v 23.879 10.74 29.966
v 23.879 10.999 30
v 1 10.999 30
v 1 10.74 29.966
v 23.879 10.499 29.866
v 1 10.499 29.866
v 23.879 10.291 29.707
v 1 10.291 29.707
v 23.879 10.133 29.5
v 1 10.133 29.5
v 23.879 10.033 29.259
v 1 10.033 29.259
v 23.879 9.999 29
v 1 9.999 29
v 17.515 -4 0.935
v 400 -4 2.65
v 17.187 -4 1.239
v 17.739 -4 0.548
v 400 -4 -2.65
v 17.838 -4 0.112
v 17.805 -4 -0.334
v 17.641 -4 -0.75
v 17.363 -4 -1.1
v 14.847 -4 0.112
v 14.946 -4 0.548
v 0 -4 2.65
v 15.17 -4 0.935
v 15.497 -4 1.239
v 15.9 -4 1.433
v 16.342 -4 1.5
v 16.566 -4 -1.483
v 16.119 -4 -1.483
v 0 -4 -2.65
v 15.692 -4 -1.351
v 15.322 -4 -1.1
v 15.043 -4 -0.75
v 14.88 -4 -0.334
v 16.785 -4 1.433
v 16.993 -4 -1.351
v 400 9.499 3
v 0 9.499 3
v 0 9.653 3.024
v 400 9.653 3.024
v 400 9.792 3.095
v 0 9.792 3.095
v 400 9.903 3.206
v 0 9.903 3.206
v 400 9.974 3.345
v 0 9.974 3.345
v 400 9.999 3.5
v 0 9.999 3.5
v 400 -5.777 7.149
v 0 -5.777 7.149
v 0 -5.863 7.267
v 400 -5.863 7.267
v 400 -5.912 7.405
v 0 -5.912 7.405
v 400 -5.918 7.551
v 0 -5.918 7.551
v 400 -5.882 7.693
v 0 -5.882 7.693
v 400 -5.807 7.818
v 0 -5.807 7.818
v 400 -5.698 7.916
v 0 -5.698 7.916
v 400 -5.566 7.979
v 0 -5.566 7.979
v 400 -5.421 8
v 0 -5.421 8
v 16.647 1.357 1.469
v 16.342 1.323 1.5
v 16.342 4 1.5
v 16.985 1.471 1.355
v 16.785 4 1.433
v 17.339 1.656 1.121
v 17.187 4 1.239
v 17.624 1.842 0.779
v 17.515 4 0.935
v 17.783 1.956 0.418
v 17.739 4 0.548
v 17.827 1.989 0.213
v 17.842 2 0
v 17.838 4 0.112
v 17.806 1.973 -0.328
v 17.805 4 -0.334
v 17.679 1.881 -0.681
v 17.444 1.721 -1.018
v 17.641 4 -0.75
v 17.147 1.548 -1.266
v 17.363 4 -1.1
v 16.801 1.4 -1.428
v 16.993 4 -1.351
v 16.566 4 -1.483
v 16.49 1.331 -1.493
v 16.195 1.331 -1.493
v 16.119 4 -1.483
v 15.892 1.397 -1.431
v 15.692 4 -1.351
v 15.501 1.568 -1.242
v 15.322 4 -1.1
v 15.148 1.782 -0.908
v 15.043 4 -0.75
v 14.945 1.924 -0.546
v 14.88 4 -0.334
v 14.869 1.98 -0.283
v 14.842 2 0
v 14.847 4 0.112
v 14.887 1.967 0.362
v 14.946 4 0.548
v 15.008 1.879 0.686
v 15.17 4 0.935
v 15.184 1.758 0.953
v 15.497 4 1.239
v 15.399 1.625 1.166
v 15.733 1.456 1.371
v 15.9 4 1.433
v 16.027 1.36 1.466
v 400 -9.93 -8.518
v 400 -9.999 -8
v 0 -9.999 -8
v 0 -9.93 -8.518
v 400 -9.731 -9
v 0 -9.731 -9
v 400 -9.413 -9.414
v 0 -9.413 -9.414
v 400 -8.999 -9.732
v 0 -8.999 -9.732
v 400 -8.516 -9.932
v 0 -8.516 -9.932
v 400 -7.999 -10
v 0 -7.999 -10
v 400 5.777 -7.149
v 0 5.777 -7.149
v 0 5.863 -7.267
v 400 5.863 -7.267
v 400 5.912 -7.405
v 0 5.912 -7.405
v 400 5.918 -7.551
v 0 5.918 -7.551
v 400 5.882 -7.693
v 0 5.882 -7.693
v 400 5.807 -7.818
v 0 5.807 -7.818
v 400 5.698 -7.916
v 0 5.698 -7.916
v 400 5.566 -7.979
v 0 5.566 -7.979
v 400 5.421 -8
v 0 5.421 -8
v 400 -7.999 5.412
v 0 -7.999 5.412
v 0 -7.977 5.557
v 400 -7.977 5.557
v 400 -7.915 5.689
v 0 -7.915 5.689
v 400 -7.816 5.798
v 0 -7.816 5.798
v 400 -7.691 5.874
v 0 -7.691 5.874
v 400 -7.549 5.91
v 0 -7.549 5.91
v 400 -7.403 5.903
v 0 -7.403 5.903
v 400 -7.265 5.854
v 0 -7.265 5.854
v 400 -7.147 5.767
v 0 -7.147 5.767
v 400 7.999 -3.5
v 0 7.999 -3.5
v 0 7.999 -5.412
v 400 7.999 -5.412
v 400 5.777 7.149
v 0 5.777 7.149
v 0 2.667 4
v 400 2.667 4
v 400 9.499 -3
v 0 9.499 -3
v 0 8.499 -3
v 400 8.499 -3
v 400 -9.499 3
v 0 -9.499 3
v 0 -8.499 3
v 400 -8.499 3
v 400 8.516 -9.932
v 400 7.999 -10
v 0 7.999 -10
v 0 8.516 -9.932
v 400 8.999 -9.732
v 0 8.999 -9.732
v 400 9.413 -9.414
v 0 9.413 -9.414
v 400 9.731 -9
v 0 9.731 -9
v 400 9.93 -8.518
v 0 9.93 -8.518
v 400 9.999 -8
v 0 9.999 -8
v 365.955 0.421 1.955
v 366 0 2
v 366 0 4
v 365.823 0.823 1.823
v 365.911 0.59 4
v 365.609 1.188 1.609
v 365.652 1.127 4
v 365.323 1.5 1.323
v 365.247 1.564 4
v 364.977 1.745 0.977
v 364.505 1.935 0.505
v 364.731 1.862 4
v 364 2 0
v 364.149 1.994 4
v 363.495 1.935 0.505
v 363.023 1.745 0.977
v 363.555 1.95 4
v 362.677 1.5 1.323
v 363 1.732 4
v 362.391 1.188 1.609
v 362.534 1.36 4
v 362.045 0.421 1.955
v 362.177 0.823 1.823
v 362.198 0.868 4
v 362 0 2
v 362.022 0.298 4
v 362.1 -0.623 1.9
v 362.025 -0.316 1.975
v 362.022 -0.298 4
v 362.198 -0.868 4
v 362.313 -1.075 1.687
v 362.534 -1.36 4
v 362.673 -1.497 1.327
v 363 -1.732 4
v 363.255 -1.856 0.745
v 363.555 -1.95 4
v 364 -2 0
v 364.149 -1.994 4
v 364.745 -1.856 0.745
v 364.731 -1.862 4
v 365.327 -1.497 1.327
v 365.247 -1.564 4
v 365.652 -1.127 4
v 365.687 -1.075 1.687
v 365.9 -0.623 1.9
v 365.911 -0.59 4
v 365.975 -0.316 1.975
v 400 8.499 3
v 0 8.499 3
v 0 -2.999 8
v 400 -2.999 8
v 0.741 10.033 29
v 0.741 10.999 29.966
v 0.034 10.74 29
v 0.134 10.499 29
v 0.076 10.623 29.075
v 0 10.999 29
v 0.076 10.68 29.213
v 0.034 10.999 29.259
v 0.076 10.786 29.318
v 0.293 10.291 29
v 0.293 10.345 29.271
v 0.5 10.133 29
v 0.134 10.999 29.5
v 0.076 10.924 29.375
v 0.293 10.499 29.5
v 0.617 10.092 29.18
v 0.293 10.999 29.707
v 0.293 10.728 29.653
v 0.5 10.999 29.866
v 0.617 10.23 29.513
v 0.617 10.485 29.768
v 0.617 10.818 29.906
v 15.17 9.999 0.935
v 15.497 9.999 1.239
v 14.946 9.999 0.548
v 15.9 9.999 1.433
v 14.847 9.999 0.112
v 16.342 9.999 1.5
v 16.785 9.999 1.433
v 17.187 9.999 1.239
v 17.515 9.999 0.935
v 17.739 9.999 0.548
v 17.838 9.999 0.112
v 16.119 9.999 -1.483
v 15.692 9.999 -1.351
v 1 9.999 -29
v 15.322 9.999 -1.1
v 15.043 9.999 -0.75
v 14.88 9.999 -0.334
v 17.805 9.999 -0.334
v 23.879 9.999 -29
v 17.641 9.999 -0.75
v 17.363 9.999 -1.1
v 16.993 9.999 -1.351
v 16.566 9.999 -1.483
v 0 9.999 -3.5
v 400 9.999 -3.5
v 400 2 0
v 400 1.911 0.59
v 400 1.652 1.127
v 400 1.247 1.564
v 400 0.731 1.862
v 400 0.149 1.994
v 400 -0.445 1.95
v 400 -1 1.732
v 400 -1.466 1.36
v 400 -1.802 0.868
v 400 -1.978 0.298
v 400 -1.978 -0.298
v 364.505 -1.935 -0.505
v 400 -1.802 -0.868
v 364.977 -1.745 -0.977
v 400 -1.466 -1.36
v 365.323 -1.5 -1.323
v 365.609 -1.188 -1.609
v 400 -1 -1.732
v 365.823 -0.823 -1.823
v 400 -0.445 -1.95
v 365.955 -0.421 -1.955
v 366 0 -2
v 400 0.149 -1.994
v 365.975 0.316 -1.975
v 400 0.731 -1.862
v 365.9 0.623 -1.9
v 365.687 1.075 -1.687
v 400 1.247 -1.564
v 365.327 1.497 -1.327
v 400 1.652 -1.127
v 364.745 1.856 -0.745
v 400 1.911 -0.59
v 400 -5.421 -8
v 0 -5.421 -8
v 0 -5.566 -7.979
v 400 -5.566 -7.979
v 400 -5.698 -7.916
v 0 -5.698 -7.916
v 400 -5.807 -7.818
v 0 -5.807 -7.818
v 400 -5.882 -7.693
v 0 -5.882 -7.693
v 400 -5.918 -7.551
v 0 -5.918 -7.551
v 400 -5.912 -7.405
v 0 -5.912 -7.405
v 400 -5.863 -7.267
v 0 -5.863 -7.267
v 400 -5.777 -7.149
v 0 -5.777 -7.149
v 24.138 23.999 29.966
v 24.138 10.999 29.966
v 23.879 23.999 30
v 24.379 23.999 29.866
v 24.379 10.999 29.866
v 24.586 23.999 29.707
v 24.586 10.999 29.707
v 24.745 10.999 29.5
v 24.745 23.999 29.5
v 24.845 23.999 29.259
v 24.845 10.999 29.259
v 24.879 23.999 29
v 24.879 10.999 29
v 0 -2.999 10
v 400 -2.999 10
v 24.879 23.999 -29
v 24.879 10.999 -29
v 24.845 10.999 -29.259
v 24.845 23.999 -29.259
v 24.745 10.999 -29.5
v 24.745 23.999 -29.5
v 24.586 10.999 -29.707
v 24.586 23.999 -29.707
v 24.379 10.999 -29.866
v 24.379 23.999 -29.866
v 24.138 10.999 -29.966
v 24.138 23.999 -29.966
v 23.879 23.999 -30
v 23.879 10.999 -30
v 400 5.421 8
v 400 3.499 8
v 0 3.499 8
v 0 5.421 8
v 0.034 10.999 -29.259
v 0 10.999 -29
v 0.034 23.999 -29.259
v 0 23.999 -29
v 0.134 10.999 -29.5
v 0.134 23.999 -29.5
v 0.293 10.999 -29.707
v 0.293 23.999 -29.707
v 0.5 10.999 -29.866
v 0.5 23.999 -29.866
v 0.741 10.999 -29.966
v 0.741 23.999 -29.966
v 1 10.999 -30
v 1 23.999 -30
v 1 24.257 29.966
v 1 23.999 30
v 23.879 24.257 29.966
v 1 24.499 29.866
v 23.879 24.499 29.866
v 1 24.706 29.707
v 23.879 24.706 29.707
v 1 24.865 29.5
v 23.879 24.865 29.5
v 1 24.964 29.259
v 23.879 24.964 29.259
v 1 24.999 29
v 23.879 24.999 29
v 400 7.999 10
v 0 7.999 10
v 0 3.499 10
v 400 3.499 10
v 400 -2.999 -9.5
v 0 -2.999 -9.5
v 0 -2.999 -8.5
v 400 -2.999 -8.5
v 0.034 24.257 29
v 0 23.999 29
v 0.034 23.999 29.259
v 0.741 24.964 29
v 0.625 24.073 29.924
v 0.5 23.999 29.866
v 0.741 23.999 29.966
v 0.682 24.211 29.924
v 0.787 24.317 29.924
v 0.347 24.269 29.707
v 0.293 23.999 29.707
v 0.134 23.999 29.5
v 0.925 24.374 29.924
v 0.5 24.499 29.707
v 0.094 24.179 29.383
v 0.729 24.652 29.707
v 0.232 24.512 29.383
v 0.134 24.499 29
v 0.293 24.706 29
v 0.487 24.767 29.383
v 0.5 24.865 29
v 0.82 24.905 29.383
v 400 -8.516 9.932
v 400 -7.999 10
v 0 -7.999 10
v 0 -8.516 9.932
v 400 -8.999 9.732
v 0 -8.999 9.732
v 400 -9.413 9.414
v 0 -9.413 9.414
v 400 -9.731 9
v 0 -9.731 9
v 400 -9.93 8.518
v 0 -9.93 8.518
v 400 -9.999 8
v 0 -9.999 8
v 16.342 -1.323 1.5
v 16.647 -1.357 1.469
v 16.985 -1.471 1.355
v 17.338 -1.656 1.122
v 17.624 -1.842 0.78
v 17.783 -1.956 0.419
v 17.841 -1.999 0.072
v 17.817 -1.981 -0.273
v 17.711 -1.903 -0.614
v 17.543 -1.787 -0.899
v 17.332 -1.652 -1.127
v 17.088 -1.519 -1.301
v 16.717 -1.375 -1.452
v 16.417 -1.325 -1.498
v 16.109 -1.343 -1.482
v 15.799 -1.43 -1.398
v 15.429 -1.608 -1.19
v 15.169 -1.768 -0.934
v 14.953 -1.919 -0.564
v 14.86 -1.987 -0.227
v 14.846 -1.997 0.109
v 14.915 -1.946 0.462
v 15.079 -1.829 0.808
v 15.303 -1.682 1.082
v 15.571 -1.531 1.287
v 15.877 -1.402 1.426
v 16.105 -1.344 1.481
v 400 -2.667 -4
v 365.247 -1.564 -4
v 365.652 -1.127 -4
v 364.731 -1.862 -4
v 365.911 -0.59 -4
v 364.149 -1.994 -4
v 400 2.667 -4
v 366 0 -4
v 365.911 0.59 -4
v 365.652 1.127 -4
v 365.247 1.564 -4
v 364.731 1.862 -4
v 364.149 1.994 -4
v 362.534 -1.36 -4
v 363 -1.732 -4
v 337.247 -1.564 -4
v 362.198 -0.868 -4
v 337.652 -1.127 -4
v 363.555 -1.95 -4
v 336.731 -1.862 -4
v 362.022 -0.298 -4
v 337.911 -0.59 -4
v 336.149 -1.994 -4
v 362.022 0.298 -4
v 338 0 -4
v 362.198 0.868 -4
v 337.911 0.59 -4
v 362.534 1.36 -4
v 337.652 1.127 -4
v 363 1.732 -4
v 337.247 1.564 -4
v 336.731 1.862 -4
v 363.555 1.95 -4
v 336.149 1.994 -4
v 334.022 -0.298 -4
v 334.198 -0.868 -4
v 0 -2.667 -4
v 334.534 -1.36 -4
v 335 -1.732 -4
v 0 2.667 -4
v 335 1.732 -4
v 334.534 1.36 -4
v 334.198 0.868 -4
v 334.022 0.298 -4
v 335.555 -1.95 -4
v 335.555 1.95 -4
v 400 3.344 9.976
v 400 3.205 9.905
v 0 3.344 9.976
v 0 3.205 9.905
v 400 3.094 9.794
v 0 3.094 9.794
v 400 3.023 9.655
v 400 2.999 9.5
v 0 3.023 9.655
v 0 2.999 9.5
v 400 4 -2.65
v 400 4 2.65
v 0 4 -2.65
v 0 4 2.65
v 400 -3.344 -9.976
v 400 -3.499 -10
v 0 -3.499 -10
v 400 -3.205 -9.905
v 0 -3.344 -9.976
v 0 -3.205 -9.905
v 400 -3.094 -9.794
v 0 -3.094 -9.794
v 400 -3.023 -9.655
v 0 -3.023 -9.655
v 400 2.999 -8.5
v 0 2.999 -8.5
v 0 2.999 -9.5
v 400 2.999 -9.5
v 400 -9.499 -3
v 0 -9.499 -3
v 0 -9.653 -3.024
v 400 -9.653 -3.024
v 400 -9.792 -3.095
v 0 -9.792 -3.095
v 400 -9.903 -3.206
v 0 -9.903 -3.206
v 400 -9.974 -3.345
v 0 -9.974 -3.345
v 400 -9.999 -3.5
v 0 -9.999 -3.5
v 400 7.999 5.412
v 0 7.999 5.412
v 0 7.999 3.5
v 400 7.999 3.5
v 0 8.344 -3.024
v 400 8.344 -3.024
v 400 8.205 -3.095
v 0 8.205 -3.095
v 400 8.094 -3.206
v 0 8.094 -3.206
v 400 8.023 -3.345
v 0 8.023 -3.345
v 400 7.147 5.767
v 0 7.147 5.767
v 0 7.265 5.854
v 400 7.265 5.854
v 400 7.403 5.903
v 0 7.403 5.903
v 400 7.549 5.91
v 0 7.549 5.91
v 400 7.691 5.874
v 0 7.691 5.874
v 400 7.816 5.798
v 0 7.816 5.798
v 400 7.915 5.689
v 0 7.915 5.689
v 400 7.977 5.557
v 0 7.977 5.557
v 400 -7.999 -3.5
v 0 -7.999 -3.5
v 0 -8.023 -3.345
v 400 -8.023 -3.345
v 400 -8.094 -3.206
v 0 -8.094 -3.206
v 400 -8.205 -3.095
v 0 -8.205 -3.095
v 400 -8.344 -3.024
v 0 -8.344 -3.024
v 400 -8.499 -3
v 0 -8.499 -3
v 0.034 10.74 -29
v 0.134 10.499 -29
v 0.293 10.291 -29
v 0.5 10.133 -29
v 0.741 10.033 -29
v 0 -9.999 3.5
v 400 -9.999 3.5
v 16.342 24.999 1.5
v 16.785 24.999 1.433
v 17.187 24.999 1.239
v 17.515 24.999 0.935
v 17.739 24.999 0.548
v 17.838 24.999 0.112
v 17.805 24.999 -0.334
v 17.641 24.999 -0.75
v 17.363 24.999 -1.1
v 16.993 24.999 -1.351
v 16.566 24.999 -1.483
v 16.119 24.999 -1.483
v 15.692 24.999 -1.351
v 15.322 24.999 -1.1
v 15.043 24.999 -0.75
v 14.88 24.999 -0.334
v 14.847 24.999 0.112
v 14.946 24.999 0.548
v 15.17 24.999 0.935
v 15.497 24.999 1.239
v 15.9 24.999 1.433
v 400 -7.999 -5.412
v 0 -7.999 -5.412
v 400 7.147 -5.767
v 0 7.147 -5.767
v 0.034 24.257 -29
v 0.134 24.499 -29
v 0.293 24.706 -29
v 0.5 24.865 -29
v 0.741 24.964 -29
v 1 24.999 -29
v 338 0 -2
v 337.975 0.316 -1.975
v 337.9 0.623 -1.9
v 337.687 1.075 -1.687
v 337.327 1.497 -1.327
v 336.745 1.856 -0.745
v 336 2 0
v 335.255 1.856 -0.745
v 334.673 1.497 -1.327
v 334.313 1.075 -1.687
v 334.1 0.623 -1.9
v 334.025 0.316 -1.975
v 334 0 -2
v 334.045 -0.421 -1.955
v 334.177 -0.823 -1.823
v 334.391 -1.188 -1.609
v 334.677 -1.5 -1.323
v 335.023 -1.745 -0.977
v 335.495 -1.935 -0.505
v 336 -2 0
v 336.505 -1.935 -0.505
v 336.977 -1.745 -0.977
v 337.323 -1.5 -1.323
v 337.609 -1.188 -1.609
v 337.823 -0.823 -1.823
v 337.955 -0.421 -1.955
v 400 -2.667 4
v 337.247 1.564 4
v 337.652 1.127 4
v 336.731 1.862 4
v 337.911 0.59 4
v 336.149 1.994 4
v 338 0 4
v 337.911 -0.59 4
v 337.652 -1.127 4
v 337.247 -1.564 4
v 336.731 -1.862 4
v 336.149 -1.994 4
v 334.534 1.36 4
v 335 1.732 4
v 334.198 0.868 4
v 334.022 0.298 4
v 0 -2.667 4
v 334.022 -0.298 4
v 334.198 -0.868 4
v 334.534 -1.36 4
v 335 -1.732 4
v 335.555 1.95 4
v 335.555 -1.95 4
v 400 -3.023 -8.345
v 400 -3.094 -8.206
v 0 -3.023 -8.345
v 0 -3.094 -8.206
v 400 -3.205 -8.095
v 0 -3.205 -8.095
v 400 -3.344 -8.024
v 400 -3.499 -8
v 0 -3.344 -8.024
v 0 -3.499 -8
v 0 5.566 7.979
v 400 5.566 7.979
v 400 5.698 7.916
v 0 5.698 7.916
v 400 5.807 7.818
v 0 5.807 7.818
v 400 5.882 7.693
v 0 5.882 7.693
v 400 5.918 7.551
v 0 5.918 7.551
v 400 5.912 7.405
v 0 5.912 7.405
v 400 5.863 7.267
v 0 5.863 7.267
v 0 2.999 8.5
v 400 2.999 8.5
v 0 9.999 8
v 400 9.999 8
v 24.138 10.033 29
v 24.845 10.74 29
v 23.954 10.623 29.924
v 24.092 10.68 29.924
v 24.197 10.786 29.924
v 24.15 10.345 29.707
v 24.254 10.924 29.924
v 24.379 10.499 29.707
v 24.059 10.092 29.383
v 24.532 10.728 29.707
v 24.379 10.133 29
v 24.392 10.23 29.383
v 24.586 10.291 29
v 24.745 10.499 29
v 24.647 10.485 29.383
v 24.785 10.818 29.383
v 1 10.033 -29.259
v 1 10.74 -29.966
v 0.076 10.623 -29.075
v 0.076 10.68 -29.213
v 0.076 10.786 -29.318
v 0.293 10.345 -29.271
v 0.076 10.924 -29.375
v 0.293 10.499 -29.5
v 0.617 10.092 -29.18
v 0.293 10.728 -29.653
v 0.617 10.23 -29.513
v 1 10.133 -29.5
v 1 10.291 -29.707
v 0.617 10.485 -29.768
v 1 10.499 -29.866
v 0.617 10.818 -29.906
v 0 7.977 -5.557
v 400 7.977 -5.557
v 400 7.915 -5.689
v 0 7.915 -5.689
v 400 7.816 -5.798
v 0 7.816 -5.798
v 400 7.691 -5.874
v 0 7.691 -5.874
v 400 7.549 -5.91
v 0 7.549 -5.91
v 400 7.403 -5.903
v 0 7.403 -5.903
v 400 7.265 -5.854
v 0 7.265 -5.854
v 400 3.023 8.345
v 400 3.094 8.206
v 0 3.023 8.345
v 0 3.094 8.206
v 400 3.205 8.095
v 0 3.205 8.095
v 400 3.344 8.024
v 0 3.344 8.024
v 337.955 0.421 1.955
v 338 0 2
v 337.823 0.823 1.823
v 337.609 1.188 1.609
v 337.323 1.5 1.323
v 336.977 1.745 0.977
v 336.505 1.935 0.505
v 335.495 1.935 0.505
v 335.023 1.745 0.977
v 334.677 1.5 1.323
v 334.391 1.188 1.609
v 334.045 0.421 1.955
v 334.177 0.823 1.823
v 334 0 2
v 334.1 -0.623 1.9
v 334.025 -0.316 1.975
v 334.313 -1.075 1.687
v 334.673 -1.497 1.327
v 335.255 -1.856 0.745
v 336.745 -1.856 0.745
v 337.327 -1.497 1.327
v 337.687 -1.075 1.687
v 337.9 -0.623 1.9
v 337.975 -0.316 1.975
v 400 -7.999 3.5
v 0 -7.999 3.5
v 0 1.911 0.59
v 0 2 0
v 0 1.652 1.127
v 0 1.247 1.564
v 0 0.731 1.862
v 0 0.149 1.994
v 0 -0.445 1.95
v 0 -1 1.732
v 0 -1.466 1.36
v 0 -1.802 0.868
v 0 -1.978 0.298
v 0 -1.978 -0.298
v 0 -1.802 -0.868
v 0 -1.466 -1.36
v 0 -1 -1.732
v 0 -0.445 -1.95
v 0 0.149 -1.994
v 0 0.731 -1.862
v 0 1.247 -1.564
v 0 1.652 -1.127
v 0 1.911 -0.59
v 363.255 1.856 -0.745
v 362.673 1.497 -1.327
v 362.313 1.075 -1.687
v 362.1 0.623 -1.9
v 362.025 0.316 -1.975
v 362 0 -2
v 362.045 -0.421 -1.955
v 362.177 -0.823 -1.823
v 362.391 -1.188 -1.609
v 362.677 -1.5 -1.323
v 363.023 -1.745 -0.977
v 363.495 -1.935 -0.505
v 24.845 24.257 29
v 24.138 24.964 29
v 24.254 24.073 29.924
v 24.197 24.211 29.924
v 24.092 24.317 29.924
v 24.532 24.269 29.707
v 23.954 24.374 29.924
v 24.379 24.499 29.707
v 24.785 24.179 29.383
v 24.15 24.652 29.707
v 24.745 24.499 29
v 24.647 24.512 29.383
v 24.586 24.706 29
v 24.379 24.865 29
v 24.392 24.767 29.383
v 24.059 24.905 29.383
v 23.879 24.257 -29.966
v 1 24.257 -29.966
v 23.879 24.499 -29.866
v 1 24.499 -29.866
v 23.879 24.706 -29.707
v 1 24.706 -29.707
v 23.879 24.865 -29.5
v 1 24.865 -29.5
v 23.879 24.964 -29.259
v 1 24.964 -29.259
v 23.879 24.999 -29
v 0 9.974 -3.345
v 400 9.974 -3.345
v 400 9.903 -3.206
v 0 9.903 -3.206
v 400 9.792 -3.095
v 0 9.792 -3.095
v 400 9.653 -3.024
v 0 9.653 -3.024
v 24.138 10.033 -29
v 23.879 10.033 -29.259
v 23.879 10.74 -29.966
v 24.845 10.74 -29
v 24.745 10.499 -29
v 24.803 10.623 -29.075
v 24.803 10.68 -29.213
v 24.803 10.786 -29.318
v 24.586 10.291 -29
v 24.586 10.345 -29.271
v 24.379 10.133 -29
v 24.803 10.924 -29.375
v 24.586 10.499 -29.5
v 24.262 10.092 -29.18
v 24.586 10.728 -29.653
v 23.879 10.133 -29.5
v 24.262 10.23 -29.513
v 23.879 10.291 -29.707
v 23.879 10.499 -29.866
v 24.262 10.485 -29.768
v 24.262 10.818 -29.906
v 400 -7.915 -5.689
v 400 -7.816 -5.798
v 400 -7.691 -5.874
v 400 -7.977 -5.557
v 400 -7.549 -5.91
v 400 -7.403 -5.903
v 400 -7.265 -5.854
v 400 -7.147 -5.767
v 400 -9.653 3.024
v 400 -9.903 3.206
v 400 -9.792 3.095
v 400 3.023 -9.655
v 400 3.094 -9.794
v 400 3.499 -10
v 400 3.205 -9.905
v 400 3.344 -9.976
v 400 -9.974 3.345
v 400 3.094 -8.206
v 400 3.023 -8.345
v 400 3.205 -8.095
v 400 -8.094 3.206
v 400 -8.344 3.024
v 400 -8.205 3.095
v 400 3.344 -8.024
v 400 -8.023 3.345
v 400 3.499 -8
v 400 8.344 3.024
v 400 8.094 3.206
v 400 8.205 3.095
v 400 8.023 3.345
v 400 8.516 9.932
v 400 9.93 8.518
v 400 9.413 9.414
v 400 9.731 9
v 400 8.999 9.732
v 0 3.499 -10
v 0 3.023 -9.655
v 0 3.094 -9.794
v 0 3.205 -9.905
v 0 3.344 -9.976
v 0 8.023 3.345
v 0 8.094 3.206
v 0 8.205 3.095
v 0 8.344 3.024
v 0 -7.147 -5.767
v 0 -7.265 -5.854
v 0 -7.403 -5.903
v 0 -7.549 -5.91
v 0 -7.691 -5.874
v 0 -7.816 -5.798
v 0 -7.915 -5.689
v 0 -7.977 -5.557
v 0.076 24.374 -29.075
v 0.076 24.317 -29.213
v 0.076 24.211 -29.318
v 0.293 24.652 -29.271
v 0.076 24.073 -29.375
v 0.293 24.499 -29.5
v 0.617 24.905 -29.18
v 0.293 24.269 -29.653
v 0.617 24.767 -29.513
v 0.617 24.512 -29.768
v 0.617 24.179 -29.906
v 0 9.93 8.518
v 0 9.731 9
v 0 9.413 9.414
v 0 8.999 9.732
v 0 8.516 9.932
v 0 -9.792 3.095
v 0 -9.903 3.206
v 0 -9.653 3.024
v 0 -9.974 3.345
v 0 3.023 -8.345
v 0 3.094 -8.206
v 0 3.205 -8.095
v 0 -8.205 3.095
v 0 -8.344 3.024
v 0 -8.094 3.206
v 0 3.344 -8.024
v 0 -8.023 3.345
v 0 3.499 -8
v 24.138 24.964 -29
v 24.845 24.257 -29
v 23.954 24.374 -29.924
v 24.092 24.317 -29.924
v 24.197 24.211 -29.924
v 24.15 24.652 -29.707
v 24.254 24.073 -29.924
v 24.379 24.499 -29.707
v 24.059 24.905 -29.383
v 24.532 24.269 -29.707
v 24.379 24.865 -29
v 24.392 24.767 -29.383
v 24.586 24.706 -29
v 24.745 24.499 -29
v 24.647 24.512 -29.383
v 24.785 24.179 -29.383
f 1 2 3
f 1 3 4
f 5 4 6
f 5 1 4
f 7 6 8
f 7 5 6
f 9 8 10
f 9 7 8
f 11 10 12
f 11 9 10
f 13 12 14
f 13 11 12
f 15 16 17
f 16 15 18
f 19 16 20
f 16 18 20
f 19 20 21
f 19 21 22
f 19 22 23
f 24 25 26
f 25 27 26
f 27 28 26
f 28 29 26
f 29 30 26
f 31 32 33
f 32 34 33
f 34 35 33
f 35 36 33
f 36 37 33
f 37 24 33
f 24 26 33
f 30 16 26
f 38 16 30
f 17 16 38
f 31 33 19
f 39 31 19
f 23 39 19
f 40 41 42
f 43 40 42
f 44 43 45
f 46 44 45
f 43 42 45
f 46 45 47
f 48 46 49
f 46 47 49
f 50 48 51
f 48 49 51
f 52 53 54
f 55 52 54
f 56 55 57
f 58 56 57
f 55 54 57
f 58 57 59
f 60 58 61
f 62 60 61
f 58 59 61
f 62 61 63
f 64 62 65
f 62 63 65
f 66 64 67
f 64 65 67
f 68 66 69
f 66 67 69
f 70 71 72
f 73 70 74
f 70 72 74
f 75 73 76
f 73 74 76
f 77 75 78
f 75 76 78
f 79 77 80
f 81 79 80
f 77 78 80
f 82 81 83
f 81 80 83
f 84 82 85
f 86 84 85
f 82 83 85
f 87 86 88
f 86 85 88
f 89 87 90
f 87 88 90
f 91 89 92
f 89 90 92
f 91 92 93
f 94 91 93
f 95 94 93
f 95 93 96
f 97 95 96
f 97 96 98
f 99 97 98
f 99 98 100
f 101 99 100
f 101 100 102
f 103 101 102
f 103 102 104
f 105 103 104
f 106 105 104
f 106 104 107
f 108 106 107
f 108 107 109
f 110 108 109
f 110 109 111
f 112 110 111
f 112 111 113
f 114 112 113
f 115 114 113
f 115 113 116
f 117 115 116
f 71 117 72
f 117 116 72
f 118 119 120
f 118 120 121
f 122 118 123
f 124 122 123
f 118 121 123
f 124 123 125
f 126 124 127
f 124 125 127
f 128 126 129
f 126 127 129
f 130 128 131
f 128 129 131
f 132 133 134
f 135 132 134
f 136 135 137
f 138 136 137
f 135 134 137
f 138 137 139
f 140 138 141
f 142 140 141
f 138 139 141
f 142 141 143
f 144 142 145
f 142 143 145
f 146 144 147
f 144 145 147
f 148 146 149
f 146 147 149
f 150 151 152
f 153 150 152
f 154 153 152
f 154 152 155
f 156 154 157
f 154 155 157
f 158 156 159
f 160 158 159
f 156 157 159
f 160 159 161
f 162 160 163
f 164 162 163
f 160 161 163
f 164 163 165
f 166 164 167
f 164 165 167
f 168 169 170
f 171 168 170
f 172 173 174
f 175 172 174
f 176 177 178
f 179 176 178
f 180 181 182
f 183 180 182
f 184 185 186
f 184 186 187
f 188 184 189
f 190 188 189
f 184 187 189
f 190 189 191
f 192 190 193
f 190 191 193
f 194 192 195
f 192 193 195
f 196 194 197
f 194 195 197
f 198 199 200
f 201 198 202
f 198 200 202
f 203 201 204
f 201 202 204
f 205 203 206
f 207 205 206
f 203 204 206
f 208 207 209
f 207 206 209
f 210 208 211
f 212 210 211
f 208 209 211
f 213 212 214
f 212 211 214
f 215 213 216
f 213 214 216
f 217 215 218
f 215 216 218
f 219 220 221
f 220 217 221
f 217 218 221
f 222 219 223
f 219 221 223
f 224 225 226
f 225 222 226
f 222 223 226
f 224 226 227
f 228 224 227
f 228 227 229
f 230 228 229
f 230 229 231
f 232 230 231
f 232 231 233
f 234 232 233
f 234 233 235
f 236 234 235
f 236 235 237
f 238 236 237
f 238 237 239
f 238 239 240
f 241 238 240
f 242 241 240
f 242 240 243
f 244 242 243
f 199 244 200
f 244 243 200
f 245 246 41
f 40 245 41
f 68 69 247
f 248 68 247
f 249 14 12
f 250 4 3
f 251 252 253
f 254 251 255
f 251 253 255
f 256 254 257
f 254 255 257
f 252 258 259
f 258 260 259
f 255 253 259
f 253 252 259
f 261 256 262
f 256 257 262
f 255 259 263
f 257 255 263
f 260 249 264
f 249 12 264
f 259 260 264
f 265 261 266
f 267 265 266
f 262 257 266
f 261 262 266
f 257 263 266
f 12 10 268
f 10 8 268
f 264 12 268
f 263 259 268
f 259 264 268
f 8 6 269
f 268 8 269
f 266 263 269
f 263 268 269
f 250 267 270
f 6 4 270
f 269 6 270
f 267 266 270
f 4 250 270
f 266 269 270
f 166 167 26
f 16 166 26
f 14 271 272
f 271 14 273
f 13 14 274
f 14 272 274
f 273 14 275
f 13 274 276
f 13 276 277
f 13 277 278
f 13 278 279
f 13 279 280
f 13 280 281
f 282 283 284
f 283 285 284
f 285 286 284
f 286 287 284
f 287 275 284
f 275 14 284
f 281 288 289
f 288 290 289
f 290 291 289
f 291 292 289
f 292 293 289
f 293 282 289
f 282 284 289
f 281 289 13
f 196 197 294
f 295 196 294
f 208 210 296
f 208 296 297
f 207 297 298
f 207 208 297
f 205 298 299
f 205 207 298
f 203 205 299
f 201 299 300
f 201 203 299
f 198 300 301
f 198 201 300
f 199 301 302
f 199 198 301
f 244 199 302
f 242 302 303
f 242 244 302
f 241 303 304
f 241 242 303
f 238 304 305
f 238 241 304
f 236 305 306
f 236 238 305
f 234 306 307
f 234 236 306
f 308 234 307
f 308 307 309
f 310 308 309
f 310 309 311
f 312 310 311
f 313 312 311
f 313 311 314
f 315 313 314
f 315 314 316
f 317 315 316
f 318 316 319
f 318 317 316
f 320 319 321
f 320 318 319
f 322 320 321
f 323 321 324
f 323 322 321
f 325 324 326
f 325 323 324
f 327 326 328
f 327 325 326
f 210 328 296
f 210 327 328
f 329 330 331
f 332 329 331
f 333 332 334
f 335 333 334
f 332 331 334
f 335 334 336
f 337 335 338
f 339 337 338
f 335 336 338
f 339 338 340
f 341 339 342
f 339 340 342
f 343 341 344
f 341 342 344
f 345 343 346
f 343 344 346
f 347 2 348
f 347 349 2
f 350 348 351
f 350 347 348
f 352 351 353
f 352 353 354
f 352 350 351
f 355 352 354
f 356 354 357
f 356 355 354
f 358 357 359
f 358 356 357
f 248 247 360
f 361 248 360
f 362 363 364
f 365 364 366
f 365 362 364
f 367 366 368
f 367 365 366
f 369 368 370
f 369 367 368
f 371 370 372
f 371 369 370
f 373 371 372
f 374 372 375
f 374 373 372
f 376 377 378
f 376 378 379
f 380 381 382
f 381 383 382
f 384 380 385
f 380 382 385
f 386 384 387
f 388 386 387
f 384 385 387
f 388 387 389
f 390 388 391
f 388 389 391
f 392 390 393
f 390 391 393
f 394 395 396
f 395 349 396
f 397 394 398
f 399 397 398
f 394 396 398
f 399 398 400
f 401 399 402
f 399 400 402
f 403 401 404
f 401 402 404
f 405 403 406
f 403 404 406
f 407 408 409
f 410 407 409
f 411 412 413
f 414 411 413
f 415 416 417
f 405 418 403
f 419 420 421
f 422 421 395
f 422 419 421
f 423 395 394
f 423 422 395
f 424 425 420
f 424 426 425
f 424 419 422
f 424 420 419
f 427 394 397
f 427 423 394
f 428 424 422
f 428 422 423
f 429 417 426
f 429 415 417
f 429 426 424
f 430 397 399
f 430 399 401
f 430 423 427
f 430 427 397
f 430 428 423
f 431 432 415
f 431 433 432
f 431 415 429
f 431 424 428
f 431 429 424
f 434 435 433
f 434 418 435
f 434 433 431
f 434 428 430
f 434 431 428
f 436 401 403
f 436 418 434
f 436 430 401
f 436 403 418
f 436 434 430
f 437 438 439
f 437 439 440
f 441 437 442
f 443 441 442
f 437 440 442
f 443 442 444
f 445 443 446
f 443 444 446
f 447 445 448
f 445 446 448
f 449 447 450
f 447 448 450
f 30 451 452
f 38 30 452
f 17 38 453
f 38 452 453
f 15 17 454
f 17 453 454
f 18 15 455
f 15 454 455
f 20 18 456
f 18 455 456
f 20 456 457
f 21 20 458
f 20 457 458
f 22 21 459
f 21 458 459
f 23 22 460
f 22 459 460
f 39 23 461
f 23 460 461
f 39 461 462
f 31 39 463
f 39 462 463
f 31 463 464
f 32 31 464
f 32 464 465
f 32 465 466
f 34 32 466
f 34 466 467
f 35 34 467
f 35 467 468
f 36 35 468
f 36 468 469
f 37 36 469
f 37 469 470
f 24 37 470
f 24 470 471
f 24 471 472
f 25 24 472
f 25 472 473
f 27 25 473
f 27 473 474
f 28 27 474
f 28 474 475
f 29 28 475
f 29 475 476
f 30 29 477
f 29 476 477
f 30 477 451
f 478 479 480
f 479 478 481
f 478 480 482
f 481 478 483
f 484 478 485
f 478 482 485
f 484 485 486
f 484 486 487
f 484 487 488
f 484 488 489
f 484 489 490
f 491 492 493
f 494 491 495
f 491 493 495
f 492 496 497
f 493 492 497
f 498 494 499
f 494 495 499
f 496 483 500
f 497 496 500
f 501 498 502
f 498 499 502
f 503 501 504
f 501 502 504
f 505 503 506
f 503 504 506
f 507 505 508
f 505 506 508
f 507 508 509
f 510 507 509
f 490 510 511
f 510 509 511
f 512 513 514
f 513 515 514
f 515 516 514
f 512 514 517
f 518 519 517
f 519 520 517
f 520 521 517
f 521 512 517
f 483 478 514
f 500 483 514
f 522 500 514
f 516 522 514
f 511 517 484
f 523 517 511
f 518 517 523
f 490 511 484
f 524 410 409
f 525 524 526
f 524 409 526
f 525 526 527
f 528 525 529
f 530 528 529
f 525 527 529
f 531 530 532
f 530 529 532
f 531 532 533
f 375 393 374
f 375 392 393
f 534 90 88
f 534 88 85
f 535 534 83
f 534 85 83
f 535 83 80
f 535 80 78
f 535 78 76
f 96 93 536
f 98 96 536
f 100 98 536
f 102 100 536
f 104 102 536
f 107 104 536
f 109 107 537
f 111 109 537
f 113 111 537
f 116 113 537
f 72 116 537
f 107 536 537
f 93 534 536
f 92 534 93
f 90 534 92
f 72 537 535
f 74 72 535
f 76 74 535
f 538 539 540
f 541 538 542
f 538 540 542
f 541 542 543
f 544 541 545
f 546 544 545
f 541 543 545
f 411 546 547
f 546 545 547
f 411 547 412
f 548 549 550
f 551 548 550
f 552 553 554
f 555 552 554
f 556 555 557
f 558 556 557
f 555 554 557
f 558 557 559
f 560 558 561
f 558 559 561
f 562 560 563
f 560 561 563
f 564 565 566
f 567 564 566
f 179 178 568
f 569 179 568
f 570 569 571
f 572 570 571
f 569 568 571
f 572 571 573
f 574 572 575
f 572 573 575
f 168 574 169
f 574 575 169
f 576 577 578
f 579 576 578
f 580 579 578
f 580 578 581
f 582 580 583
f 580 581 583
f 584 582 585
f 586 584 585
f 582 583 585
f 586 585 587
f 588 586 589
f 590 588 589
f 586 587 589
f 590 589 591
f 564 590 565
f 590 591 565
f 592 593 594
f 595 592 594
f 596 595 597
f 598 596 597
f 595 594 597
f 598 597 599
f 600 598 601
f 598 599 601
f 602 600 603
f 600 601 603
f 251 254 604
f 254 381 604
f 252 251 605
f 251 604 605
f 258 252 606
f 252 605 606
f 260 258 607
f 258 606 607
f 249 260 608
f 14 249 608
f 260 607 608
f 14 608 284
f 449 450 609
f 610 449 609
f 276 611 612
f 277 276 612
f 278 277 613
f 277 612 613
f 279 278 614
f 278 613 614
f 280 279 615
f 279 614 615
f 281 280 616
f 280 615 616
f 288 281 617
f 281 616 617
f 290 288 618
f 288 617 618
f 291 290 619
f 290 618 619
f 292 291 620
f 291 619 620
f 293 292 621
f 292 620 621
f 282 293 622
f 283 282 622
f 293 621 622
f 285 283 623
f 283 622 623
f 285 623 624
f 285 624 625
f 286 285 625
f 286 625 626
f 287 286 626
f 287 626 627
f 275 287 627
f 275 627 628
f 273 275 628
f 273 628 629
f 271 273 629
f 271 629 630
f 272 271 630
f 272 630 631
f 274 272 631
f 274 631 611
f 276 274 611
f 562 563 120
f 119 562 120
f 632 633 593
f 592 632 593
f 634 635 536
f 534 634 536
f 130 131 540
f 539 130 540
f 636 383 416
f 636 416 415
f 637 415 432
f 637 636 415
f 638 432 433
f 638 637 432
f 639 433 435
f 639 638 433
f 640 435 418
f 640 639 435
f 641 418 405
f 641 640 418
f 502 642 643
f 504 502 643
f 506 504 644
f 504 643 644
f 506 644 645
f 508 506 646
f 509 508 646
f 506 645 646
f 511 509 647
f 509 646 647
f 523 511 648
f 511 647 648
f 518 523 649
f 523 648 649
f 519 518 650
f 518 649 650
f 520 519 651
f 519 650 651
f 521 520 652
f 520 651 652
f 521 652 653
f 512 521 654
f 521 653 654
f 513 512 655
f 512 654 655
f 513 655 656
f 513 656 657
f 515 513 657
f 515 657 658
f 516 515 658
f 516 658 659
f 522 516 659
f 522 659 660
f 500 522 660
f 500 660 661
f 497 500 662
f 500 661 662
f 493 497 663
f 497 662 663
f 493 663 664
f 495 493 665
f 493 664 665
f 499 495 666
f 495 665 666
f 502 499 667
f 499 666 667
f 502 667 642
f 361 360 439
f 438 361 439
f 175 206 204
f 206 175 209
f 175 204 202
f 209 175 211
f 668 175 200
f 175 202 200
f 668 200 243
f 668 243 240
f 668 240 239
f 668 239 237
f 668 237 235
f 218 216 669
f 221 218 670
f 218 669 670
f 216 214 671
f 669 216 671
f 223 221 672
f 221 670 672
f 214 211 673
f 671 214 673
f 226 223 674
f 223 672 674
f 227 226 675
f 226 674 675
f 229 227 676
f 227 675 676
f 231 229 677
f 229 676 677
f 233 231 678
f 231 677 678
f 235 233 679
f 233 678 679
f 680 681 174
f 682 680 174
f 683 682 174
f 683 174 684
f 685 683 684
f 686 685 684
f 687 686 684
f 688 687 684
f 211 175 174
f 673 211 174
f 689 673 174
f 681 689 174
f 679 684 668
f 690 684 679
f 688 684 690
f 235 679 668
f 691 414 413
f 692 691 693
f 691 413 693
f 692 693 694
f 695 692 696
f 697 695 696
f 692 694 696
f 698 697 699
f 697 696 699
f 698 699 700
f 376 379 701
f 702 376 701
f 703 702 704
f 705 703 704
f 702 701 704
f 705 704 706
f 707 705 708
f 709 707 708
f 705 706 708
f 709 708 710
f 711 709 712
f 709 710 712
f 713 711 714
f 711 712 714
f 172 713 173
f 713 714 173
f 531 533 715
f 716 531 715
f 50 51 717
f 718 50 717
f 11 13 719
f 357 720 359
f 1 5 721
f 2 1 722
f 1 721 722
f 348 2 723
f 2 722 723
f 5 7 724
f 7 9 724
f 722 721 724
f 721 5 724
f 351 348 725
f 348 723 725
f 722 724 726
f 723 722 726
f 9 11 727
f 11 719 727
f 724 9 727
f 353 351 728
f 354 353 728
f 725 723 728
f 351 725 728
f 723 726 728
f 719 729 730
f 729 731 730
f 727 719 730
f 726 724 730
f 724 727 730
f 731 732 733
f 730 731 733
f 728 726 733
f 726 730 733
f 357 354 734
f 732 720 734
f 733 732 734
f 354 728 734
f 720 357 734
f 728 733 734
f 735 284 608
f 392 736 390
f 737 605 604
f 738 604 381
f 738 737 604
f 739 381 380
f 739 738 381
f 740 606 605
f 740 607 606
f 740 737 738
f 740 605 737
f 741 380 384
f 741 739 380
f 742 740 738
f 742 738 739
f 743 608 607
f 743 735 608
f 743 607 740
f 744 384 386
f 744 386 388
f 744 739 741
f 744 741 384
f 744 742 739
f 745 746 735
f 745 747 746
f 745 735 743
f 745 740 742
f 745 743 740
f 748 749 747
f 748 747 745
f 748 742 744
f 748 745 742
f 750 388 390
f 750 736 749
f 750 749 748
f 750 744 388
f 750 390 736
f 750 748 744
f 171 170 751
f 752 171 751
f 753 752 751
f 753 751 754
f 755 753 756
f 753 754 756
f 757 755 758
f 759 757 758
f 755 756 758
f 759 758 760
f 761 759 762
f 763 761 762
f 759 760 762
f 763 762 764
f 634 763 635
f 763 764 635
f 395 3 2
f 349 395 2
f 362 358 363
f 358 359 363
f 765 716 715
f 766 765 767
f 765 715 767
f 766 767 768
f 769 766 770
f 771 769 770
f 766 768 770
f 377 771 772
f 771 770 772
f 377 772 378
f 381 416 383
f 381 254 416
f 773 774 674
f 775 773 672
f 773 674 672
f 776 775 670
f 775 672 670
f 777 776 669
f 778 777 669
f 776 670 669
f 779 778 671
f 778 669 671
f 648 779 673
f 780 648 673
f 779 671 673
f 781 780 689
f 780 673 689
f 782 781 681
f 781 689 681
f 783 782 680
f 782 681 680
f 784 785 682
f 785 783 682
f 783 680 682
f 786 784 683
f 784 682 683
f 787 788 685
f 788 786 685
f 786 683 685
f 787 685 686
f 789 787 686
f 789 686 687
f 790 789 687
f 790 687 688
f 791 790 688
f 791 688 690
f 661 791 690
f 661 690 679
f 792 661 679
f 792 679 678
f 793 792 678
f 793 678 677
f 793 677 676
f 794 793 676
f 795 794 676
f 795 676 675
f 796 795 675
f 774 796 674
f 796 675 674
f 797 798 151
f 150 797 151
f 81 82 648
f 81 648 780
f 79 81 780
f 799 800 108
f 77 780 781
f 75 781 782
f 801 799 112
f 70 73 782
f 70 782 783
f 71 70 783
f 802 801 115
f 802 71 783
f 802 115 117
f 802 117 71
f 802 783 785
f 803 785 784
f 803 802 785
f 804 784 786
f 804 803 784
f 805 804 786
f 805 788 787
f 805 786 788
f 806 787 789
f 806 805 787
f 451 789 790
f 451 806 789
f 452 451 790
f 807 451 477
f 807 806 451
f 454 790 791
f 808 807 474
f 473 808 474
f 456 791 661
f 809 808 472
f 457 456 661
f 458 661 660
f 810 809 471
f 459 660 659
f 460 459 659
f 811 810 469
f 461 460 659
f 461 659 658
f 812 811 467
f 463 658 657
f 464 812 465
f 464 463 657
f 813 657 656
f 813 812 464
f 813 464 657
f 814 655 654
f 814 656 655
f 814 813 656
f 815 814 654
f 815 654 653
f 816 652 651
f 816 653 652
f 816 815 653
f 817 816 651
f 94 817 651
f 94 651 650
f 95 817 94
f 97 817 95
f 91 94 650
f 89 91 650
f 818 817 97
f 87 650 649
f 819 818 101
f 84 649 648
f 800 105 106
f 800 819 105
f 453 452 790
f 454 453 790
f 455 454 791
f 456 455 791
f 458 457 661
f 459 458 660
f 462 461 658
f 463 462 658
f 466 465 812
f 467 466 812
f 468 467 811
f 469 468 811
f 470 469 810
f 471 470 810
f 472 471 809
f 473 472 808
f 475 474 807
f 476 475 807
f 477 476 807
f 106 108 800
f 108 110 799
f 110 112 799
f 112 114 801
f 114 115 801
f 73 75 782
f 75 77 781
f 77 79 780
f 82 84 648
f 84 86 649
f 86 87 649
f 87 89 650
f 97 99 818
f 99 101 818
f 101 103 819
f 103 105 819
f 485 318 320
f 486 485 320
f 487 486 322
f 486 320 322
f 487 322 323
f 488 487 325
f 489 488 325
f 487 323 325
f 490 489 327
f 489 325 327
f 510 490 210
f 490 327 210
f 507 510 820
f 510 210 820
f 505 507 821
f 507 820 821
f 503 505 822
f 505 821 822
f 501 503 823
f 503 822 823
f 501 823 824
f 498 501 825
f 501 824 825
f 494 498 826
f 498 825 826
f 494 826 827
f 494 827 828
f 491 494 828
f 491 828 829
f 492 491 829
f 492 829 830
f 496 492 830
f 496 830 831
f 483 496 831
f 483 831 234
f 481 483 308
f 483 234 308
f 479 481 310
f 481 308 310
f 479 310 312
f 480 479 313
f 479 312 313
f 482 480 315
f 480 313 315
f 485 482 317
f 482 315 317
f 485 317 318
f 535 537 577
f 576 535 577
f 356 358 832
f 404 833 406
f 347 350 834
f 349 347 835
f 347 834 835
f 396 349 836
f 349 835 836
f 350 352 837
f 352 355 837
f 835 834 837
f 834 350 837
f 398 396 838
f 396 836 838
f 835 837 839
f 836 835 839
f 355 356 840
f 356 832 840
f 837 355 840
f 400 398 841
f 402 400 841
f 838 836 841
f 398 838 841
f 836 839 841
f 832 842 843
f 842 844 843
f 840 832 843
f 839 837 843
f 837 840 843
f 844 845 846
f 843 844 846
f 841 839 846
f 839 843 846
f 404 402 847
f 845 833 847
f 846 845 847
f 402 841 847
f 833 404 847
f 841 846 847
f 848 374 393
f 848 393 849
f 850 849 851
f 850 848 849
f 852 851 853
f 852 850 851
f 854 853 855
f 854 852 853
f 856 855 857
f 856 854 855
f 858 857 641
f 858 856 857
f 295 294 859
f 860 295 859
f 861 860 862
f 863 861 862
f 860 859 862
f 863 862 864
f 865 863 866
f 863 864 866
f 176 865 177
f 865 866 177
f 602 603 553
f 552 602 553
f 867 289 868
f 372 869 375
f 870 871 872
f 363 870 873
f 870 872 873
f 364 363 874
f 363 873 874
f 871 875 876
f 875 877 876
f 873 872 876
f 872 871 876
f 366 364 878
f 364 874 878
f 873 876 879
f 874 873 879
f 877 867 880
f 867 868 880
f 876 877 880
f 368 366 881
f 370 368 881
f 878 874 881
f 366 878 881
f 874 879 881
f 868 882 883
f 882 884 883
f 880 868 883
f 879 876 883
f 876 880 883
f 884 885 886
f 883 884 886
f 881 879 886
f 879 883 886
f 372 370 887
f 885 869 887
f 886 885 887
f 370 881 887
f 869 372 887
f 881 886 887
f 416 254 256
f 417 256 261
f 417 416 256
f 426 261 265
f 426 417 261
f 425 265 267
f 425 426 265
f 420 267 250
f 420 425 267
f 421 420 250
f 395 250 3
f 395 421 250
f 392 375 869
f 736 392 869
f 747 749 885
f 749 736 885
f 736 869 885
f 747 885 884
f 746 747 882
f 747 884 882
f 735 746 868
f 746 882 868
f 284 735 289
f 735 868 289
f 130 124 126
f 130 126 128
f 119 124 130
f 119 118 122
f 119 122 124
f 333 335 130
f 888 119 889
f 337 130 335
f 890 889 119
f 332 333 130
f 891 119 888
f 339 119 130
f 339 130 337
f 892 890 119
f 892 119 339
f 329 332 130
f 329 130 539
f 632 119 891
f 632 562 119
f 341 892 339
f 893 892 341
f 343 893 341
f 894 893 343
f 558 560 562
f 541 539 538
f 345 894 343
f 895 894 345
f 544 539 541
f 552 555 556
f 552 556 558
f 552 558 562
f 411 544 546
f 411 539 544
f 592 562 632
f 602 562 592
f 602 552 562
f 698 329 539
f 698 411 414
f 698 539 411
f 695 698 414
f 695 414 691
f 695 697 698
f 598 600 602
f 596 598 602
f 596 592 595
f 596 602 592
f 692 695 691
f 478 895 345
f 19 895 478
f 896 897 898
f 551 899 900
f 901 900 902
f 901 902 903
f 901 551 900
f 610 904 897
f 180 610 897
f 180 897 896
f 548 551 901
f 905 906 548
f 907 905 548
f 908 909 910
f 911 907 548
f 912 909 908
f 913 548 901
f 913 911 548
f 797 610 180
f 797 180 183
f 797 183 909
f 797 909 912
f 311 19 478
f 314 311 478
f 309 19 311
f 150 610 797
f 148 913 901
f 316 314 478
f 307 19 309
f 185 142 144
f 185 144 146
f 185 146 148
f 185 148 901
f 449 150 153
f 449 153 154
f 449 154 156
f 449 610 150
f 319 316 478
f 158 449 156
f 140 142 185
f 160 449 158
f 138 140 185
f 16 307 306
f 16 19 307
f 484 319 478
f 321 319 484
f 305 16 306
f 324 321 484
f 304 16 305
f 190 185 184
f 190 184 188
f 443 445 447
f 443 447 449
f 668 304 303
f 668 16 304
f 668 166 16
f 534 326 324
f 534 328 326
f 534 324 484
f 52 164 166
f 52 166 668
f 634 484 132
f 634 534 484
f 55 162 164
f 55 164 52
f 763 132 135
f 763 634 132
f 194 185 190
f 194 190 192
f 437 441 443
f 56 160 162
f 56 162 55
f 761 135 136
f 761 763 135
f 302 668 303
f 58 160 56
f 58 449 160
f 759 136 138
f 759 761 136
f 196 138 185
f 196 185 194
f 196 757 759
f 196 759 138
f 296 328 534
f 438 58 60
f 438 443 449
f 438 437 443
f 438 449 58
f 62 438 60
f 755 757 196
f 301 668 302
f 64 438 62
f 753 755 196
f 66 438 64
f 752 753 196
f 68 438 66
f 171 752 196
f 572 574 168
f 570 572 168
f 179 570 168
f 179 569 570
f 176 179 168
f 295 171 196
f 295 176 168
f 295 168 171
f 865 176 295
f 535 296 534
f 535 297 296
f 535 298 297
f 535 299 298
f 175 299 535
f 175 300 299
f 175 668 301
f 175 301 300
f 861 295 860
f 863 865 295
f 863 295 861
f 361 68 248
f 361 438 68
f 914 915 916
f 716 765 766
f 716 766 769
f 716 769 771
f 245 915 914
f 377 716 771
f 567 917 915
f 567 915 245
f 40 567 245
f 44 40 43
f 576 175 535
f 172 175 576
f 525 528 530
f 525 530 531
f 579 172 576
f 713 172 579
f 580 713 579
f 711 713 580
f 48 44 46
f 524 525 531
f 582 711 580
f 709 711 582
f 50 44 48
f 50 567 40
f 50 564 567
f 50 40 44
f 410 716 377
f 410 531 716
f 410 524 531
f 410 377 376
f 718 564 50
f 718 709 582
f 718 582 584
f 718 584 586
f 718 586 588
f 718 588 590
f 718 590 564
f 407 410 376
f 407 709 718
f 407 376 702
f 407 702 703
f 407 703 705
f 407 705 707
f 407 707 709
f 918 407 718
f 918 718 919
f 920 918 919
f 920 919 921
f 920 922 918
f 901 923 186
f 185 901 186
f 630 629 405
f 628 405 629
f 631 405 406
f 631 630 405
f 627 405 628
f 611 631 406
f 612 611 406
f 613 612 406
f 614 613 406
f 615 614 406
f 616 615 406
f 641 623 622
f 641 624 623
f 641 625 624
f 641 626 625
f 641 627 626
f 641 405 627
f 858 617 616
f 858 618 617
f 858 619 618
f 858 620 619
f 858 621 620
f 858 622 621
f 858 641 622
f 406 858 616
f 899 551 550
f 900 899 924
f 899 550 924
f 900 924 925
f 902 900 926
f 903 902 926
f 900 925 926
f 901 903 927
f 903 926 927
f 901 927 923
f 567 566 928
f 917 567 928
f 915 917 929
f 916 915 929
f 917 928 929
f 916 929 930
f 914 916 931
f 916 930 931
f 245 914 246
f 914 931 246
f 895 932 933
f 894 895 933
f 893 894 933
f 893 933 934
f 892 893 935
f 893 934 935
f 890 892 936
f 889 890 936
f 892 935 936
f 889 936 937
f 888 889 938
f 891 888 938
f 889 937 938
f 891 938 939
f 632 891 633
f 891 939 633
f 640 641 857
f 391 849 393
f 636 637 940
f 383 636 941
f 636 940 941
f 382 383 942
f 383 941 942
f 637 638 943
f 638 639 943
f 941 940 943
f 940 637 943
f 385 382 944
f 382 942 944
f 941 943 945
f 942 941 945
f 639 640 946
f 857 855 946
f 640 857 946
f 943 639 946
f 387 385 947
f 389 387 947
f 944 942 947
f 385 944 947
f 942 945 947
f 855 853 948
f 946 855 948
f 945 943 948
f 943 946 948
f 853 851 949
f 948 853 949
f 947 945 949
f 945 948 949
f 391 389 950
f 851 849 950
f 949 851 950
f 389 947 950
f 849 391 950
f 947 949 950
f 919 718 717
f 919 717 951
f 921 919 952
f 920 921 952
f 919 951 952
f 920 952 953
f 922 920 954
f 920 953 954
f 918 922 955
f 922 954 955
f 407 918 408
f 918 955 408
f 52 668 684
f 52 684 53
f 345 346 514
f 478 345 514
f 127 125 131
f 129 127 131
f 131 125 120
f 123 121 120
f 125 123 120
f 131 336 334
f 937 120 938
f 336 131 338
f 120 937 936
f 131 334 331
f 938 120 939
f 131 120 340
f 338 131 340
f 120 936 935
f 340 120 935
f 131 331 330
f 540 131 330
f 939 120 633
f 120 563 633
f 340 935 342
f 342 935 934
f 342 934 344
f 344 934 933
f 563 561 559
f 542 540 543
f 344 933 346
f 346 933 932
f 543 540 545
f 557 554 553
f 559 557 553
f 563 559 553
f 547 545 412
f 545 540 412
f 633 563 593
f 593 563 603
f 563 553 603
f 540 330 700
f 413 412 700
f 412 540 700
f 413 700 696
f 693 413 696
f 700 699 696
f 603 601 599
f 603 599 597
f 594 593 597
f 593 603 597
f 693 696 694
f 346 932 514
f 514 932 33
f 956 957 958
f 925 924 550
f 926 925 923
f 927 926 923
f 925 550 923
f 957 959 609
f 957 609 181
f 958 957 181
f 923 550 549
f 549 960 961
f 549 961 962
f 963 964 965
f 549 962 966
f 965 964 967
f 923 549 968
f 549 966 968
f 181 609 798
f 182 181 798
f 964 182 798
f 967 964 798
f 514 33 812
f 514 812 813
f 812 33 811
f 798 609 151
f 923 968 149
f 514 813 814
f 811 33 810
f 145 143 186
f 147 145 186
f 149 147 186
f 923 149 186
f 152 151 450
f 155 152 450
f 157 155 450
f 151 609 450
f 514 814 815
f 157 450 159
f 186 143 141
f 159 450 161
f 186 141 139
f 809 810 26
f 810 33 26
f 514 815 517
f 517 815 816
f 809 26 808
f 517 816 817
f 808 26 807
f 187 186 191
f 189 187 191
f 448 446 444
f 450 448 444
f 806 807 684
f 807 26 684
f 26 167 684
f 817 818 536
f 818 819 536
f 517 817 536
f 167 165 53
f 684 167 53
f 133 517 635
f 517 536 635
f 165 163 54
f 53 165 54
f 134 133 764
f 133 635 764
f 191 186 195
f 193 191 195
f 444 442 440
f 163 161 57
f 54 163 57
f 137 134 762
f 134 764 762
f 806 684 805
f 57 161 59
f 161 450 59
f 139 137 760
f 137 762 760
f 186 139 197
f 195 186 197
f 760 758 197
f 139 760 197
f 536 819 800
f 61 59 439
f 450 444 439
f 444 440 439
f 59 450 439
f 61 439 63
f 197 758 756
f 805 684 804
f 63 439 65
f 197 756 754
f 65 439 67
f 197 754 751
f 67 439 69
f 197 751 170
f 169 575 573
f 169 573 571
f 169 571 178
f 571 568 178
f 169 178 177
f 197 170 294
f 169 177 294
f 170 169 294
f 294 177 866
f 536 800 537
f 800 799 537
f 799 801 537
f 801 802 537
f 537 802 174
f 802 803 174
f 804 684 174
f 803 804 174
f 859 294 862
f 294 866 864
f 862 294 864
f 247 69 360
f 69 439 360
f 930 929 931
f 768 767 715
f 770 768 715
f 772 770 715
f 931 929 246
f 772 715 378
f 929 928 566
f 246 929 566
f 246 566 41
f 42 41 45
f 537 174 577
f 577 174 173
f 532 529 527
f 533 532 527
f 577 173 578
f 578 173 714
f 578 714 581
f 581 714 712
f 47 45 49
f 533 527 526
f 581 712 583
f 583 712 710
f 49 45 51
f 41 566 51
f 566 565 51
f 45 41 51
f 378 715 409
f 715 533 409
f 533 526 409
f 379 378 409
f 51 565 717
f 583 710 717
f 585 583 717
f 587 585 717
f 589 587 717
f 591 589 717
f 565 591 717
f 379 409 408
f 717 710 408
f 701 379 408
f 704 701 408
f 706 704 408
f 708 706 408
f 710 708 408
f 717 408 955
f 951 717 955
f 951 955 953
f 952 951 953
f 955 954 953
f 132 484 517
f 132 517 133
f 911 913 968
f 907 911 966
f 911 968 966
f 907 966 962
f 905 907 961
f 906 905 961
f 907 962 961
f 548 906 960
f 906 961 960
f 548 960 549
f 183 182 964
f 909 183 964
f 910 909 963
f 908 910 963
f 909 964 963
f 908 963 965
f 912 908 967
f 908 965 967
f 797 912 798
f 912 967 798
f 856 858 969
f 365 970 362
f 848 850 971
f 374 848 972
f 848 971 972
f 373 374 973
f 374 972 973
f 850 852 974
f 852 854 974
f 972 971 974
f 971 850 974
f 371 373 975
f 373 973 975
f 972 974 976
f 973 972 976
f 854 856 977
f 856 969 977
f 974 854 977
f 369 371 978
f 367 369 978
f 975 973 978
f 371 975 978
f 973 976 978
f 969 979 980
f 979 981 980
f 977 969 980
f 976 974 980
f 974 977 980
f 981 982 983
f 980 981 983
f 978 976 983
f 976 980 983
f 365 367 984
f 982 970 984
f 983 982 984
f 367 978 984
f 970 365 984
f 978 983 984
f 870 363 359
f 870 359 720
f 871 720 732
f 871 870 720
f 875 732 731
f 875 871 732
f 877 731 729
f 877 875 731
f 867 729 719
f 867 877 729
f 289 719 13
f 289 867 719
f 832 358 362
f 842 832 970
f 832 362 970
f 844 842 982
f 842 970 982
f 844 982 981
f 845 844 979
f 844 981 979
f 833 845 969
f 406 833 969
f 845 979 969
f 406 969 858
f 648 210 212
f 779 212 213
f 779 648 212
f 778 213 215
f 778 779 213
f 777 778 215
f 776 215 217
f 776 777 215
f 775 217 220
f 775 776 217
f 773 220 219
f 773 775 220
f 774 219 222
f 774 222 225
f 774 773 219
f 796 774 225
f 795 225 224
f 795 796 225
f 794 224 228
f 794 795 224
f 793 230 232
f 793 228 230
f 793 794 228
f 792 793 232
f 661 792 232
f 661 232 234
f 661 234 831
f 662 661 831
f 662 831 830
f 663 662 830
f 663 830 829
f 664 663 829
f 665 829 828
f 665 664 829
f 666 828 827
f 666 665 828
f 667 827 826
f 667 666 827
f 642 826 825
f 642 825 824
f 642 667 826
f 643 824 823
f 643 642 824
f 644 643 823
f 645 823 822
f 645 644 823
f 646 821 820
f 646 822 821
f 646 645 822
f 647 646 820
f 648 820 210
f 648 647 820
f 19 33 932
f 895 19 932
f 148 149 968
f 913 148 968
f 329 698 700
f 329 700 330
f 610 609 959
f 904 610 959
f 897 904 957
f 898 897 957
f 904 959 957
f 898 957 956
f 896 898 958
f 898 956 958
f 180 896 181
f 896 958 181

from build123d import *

# Parameters (mm, degrees)
SKETCH2_R                       = 2
ALUMINIUM_PROFILE_20_20_1_DEPTH = 400
SKETCH3_R                       = 2
CUT_EXTRUDE1_DEPTH              = 40
SKETCH4_W                       = 24.878997643
SKETCH4_H                       = 60
BOSS_EXTRUDE1_DEPTH             = 15
FILLET1_R                       = 1
SKETCH6_R                       = 1.5
CUT_EXTRUDE2_DEPTH              = 40


with BuildPart() as part:
    # Sketch2 → Aluminium profile 20×20(1) (new body)
    with BuildSketch(Plane.YZ):
        with BuildLine():
            Line((-2.666639653, -4), (2.666639653, -4))
            Line((2.666639653, -4), (5.776647091, -7.148635412))
            ThreePointArc((5.776647091, -7.148635412), (5.882265465, -7.692766317), (5.420918365, -8))
            Line((5.420918365, -8), (3.498570355, -8))
            ThreePointArc((3.498570355, -8), (3.145016964, -8.146446609), (2.998570355, -8.5))
            Line((2.998570355, -8.5), (2.998570355, -9.5))
            ThreePointArc((2.998570355, -9.5), (3.145016964, -9.853553391), (3.498570355, -10))
            Line((3.498570355, -10), (7.998570355, -10))
            ThreePointArc((7.998570355, -10), (9.412783917, -9.414213562), (9.998570355, -8))
            Line((9.998570355, -8), (9.998570355, -3.5))
            ThreePointArc((9.998570355, -3.5), (9.852123746, -3.146446609), (9.498570355, -3))
            Line((9.498570355, -3), (8.498570355, -3))
            ThreePointArc((8.498570355, -3), (8.145016964, -3.146446609), (7.998570355, -3.5))
            Line((7.998570355, -3.5), (7.998570355, -5.412091861))
            ThreePointArc((7.998570355, -5.412091861), (7.691000546, -5.873579263), (7.146687869, -5.767308297))
            Line((7.146687869, -5.767308297), (4, -2.650154242))
            Line((4, -2.650154242), (4, 2.650154242))
            Line((4, 2.650154242), (7.146687869, 5.767308297))
            ThreePointArc((7.146687869, 5.767308297), (7.691000546, 5.873579263), (7.998570355, 5.412091861))
            Line((7.998570355, 5.412091861), (7.998570355, 3.5))
            ThreePointArc((7.998570355, 3.5), (8.145016964, 3.146446609), (8.498570355, 3))
            Line((8.498570355, 3), (9.498570355, 3))
            ThreePointArc((9.498570355, 3), (9.852123746, 3.146446609), (9.998570355, 3.5))
            Line((9.998570355, 3.5), (9.998570355, 8))
            ThreePointArc((9.998570355, 8), (9.412783917, 9.414213562), (7.998570355, 10))
            Line((7.998570355, 10), (3.498570355, 10))
            ThreePointArc((3.498570355, 10), (3.145016964, 9.853553391), (2.998570355, 9.5))
            Line((2.998570355, 9.5), (2.998570355, 8.5))
            ThreePointArc((2.998570355, 8.5), (3.145016964, 8.146446609), (3.498570355, 8))
            Line((3.498570355, 8), (5.420918365, 8))
            ThreePointArc((5.420918365, 8), (5.882265465, 7.692766317), (5.776647091, 7.148635412))
            Line((5.776647091, 7.148635412), (2.666639653, 4))
            Line((2.666639653, 4), (-2.666639653, 4))
            Line((-2.666639653, 4), (-5.776647091, 7.148635412))
            ThreePointArc((-5.776647091, 7.148635412), (-5.882265465, 7.692766317), (-5.420918365, 8))
            Line((-5.420918365, 8), (-2.998570355, 8))
            Line((-2.998570355, 8), (-2.998570355, 10))
            Line((-2.998570355, 10), (-7.998570355, 10))
            ThreePointArc((-7.998570355, 10), (-9.412783917, 9.414213562), (-9.998570355, 8))
            Line((-9.998570355, 8), (-9.998570355, 3.5))
            ThreePointArc((-9.998570355, 3.5), (-9.852123746, 3.146446609), (-9.498570355, 3))
            Line((-9.498570355, 3), (-8.498570355, 3))
            ThreePointArc((-8.498570355, 3), (-8.145016964, 3.146446609), (-7.998570355, 3.5))
            Line((-7.998570355, 3.5), (-7.998570355, 5.412091861))
            ThreePointArc((-7.998570355, 5.412091861), (-7.691000546, 5.873579263), (-7.146687869, 5.767308297))
            Line((-7.146687869, 5.767308297), (-4, 2.650154242))
            Line((-4, 2.650154242), (-4, -2.650154242))
            Line((-4, -2.650154242), (-7.146687869, -5.767308297))
            ThreePointArc((-7.146687869, -5.767308297), (-7.691000546, -5.873579263), (-7.998570355, -5.412091861))
            Line((-7.998570355, -5.412091861), (-7.998570355, -3.5))
            ThreePointArc((-7.998570355, -3.5), (-8.145016964, -3.146446609), (-8.498570355, -3))
            Line((-8.498570355, -3), (-9.498570355, -3))
            ThreePointArc((-9.498570355, -3), (-9.852123746, -3.146446609), (-9.998570355, -3.5))
            Line((-9.998570355, -3.5), (-9.998570355, -8))
            ThreePointArc((-9.998570355, -8), (-9.412783917, -9.414213562), (-7.998570355, -10))
            Line((-7.998570355, -10), (-3.498570355, -10))
            ThreePointArc((-3.498570355, -10), (-3.145016964, -9.853553391), (-2.998570355, -9.5))
            Line((-2.998570355, -9.5), (-2.998570355, -8.5))
            ThreePointArc((-2.998570355, -8.5), (-3.145016964, -8.146446609), (-3.498570355, -8))
            Line((-3.498570355, -8), (-5.420918365, -8))
            ThreePointArc((-5.420918365, -8), (-5.882265465, -7.692766317), (-5.776647091, -7.148635412))
            Line((-5.776647091, -7.148635412), (-2.666639653, -4))
        make_face()
        Circle(SKETCH2_R, mode=Mode.SUBTRACT)
    extrude(amount=ALUMINIUM_PROFILE_20_20_1_DEPTH)

    # Sketch3 → Cut-Extrude1 (cut)
    with BuildSketch(Plane.XY.offset(10)):
        with Locations((364, 0)):
            Circle(SKETCH3_R)
        with Locations((336, 0)):
            Circle(SKETCH3_R)
    extrude(amount=-CUT_EXTRUDE1_DEPTH, mode=Mode.SUBTRACT)


with BuildPart() as body_2:
    # Sketch4 → Boss-Extrude1 (new body)
    with BuildSketch(Plane(origin=(0, 9.998570355, 0), x_dir=(1, 0, 0), z_dir=(0, 1, 0))):
        with Locations((12.439498822, 0)):
            Rectangle(SKETCH4_W, SKETCH4_H)
    extrude(amount=BOSS_EXTRUDE1_DEPTH)

    # Fillet1
    fillet1_edges = [body_2.edges().sort_by_distance(p)[0] for p in [
        (24.878997643, 24.998570355, 0),
        (12.439498821, 24.998570355, -30),
        (0, 24.998570355, 0),
        (12.439498821, 9.998570355, -30),
        (24.878997643, 9.998570355, 0),
        (12.439498821, 9.998570355, 30),
        (0, 9.998570355, 0),
        (0, 17.498570355, -30),
        (24.878997643, 17.498570355, -30),
        (24.878997643, 17.498570355, 30),
        (0, 17.498570355, 30),
        (12.439498821, 24.998570355, 30),
    ]]
    fillet(fillet1_edges, radius=FILLET1_R)


with BuildPart() as cut_extrude2_tool:
    # Sketch6 → Cut-Extrude2 (new body)
    with BuildSketch(Plane(origin=(0, 24.998570355, 0), x_dir=(1, 0, 0), z_dir=(0, 1, 0))):
        with Locations(Location((16.342417806, 0, 0), (0, 0, 270))):
            Circle(SKETCH6_R)
    extrude(amount=-CUT_EXTRUDE2_DEPTH)


with BuildPart() as part_1:
    add(part.part)

    # Cut-Extrude2: cut by cut_extrude2_tool
    add(cut_extrude2_tool.part, mode=Mode.SUBTRACT)


with BuildPart() as body_2_1:
    add(body_2.part)

    # Cut-Extrude2: cut by cut_extrude2_tool
    add(cut_extrude2_tool.part, mode=Mode.SUBTRACT)


solid = Compound([part_1.part, body_2_1.part])
